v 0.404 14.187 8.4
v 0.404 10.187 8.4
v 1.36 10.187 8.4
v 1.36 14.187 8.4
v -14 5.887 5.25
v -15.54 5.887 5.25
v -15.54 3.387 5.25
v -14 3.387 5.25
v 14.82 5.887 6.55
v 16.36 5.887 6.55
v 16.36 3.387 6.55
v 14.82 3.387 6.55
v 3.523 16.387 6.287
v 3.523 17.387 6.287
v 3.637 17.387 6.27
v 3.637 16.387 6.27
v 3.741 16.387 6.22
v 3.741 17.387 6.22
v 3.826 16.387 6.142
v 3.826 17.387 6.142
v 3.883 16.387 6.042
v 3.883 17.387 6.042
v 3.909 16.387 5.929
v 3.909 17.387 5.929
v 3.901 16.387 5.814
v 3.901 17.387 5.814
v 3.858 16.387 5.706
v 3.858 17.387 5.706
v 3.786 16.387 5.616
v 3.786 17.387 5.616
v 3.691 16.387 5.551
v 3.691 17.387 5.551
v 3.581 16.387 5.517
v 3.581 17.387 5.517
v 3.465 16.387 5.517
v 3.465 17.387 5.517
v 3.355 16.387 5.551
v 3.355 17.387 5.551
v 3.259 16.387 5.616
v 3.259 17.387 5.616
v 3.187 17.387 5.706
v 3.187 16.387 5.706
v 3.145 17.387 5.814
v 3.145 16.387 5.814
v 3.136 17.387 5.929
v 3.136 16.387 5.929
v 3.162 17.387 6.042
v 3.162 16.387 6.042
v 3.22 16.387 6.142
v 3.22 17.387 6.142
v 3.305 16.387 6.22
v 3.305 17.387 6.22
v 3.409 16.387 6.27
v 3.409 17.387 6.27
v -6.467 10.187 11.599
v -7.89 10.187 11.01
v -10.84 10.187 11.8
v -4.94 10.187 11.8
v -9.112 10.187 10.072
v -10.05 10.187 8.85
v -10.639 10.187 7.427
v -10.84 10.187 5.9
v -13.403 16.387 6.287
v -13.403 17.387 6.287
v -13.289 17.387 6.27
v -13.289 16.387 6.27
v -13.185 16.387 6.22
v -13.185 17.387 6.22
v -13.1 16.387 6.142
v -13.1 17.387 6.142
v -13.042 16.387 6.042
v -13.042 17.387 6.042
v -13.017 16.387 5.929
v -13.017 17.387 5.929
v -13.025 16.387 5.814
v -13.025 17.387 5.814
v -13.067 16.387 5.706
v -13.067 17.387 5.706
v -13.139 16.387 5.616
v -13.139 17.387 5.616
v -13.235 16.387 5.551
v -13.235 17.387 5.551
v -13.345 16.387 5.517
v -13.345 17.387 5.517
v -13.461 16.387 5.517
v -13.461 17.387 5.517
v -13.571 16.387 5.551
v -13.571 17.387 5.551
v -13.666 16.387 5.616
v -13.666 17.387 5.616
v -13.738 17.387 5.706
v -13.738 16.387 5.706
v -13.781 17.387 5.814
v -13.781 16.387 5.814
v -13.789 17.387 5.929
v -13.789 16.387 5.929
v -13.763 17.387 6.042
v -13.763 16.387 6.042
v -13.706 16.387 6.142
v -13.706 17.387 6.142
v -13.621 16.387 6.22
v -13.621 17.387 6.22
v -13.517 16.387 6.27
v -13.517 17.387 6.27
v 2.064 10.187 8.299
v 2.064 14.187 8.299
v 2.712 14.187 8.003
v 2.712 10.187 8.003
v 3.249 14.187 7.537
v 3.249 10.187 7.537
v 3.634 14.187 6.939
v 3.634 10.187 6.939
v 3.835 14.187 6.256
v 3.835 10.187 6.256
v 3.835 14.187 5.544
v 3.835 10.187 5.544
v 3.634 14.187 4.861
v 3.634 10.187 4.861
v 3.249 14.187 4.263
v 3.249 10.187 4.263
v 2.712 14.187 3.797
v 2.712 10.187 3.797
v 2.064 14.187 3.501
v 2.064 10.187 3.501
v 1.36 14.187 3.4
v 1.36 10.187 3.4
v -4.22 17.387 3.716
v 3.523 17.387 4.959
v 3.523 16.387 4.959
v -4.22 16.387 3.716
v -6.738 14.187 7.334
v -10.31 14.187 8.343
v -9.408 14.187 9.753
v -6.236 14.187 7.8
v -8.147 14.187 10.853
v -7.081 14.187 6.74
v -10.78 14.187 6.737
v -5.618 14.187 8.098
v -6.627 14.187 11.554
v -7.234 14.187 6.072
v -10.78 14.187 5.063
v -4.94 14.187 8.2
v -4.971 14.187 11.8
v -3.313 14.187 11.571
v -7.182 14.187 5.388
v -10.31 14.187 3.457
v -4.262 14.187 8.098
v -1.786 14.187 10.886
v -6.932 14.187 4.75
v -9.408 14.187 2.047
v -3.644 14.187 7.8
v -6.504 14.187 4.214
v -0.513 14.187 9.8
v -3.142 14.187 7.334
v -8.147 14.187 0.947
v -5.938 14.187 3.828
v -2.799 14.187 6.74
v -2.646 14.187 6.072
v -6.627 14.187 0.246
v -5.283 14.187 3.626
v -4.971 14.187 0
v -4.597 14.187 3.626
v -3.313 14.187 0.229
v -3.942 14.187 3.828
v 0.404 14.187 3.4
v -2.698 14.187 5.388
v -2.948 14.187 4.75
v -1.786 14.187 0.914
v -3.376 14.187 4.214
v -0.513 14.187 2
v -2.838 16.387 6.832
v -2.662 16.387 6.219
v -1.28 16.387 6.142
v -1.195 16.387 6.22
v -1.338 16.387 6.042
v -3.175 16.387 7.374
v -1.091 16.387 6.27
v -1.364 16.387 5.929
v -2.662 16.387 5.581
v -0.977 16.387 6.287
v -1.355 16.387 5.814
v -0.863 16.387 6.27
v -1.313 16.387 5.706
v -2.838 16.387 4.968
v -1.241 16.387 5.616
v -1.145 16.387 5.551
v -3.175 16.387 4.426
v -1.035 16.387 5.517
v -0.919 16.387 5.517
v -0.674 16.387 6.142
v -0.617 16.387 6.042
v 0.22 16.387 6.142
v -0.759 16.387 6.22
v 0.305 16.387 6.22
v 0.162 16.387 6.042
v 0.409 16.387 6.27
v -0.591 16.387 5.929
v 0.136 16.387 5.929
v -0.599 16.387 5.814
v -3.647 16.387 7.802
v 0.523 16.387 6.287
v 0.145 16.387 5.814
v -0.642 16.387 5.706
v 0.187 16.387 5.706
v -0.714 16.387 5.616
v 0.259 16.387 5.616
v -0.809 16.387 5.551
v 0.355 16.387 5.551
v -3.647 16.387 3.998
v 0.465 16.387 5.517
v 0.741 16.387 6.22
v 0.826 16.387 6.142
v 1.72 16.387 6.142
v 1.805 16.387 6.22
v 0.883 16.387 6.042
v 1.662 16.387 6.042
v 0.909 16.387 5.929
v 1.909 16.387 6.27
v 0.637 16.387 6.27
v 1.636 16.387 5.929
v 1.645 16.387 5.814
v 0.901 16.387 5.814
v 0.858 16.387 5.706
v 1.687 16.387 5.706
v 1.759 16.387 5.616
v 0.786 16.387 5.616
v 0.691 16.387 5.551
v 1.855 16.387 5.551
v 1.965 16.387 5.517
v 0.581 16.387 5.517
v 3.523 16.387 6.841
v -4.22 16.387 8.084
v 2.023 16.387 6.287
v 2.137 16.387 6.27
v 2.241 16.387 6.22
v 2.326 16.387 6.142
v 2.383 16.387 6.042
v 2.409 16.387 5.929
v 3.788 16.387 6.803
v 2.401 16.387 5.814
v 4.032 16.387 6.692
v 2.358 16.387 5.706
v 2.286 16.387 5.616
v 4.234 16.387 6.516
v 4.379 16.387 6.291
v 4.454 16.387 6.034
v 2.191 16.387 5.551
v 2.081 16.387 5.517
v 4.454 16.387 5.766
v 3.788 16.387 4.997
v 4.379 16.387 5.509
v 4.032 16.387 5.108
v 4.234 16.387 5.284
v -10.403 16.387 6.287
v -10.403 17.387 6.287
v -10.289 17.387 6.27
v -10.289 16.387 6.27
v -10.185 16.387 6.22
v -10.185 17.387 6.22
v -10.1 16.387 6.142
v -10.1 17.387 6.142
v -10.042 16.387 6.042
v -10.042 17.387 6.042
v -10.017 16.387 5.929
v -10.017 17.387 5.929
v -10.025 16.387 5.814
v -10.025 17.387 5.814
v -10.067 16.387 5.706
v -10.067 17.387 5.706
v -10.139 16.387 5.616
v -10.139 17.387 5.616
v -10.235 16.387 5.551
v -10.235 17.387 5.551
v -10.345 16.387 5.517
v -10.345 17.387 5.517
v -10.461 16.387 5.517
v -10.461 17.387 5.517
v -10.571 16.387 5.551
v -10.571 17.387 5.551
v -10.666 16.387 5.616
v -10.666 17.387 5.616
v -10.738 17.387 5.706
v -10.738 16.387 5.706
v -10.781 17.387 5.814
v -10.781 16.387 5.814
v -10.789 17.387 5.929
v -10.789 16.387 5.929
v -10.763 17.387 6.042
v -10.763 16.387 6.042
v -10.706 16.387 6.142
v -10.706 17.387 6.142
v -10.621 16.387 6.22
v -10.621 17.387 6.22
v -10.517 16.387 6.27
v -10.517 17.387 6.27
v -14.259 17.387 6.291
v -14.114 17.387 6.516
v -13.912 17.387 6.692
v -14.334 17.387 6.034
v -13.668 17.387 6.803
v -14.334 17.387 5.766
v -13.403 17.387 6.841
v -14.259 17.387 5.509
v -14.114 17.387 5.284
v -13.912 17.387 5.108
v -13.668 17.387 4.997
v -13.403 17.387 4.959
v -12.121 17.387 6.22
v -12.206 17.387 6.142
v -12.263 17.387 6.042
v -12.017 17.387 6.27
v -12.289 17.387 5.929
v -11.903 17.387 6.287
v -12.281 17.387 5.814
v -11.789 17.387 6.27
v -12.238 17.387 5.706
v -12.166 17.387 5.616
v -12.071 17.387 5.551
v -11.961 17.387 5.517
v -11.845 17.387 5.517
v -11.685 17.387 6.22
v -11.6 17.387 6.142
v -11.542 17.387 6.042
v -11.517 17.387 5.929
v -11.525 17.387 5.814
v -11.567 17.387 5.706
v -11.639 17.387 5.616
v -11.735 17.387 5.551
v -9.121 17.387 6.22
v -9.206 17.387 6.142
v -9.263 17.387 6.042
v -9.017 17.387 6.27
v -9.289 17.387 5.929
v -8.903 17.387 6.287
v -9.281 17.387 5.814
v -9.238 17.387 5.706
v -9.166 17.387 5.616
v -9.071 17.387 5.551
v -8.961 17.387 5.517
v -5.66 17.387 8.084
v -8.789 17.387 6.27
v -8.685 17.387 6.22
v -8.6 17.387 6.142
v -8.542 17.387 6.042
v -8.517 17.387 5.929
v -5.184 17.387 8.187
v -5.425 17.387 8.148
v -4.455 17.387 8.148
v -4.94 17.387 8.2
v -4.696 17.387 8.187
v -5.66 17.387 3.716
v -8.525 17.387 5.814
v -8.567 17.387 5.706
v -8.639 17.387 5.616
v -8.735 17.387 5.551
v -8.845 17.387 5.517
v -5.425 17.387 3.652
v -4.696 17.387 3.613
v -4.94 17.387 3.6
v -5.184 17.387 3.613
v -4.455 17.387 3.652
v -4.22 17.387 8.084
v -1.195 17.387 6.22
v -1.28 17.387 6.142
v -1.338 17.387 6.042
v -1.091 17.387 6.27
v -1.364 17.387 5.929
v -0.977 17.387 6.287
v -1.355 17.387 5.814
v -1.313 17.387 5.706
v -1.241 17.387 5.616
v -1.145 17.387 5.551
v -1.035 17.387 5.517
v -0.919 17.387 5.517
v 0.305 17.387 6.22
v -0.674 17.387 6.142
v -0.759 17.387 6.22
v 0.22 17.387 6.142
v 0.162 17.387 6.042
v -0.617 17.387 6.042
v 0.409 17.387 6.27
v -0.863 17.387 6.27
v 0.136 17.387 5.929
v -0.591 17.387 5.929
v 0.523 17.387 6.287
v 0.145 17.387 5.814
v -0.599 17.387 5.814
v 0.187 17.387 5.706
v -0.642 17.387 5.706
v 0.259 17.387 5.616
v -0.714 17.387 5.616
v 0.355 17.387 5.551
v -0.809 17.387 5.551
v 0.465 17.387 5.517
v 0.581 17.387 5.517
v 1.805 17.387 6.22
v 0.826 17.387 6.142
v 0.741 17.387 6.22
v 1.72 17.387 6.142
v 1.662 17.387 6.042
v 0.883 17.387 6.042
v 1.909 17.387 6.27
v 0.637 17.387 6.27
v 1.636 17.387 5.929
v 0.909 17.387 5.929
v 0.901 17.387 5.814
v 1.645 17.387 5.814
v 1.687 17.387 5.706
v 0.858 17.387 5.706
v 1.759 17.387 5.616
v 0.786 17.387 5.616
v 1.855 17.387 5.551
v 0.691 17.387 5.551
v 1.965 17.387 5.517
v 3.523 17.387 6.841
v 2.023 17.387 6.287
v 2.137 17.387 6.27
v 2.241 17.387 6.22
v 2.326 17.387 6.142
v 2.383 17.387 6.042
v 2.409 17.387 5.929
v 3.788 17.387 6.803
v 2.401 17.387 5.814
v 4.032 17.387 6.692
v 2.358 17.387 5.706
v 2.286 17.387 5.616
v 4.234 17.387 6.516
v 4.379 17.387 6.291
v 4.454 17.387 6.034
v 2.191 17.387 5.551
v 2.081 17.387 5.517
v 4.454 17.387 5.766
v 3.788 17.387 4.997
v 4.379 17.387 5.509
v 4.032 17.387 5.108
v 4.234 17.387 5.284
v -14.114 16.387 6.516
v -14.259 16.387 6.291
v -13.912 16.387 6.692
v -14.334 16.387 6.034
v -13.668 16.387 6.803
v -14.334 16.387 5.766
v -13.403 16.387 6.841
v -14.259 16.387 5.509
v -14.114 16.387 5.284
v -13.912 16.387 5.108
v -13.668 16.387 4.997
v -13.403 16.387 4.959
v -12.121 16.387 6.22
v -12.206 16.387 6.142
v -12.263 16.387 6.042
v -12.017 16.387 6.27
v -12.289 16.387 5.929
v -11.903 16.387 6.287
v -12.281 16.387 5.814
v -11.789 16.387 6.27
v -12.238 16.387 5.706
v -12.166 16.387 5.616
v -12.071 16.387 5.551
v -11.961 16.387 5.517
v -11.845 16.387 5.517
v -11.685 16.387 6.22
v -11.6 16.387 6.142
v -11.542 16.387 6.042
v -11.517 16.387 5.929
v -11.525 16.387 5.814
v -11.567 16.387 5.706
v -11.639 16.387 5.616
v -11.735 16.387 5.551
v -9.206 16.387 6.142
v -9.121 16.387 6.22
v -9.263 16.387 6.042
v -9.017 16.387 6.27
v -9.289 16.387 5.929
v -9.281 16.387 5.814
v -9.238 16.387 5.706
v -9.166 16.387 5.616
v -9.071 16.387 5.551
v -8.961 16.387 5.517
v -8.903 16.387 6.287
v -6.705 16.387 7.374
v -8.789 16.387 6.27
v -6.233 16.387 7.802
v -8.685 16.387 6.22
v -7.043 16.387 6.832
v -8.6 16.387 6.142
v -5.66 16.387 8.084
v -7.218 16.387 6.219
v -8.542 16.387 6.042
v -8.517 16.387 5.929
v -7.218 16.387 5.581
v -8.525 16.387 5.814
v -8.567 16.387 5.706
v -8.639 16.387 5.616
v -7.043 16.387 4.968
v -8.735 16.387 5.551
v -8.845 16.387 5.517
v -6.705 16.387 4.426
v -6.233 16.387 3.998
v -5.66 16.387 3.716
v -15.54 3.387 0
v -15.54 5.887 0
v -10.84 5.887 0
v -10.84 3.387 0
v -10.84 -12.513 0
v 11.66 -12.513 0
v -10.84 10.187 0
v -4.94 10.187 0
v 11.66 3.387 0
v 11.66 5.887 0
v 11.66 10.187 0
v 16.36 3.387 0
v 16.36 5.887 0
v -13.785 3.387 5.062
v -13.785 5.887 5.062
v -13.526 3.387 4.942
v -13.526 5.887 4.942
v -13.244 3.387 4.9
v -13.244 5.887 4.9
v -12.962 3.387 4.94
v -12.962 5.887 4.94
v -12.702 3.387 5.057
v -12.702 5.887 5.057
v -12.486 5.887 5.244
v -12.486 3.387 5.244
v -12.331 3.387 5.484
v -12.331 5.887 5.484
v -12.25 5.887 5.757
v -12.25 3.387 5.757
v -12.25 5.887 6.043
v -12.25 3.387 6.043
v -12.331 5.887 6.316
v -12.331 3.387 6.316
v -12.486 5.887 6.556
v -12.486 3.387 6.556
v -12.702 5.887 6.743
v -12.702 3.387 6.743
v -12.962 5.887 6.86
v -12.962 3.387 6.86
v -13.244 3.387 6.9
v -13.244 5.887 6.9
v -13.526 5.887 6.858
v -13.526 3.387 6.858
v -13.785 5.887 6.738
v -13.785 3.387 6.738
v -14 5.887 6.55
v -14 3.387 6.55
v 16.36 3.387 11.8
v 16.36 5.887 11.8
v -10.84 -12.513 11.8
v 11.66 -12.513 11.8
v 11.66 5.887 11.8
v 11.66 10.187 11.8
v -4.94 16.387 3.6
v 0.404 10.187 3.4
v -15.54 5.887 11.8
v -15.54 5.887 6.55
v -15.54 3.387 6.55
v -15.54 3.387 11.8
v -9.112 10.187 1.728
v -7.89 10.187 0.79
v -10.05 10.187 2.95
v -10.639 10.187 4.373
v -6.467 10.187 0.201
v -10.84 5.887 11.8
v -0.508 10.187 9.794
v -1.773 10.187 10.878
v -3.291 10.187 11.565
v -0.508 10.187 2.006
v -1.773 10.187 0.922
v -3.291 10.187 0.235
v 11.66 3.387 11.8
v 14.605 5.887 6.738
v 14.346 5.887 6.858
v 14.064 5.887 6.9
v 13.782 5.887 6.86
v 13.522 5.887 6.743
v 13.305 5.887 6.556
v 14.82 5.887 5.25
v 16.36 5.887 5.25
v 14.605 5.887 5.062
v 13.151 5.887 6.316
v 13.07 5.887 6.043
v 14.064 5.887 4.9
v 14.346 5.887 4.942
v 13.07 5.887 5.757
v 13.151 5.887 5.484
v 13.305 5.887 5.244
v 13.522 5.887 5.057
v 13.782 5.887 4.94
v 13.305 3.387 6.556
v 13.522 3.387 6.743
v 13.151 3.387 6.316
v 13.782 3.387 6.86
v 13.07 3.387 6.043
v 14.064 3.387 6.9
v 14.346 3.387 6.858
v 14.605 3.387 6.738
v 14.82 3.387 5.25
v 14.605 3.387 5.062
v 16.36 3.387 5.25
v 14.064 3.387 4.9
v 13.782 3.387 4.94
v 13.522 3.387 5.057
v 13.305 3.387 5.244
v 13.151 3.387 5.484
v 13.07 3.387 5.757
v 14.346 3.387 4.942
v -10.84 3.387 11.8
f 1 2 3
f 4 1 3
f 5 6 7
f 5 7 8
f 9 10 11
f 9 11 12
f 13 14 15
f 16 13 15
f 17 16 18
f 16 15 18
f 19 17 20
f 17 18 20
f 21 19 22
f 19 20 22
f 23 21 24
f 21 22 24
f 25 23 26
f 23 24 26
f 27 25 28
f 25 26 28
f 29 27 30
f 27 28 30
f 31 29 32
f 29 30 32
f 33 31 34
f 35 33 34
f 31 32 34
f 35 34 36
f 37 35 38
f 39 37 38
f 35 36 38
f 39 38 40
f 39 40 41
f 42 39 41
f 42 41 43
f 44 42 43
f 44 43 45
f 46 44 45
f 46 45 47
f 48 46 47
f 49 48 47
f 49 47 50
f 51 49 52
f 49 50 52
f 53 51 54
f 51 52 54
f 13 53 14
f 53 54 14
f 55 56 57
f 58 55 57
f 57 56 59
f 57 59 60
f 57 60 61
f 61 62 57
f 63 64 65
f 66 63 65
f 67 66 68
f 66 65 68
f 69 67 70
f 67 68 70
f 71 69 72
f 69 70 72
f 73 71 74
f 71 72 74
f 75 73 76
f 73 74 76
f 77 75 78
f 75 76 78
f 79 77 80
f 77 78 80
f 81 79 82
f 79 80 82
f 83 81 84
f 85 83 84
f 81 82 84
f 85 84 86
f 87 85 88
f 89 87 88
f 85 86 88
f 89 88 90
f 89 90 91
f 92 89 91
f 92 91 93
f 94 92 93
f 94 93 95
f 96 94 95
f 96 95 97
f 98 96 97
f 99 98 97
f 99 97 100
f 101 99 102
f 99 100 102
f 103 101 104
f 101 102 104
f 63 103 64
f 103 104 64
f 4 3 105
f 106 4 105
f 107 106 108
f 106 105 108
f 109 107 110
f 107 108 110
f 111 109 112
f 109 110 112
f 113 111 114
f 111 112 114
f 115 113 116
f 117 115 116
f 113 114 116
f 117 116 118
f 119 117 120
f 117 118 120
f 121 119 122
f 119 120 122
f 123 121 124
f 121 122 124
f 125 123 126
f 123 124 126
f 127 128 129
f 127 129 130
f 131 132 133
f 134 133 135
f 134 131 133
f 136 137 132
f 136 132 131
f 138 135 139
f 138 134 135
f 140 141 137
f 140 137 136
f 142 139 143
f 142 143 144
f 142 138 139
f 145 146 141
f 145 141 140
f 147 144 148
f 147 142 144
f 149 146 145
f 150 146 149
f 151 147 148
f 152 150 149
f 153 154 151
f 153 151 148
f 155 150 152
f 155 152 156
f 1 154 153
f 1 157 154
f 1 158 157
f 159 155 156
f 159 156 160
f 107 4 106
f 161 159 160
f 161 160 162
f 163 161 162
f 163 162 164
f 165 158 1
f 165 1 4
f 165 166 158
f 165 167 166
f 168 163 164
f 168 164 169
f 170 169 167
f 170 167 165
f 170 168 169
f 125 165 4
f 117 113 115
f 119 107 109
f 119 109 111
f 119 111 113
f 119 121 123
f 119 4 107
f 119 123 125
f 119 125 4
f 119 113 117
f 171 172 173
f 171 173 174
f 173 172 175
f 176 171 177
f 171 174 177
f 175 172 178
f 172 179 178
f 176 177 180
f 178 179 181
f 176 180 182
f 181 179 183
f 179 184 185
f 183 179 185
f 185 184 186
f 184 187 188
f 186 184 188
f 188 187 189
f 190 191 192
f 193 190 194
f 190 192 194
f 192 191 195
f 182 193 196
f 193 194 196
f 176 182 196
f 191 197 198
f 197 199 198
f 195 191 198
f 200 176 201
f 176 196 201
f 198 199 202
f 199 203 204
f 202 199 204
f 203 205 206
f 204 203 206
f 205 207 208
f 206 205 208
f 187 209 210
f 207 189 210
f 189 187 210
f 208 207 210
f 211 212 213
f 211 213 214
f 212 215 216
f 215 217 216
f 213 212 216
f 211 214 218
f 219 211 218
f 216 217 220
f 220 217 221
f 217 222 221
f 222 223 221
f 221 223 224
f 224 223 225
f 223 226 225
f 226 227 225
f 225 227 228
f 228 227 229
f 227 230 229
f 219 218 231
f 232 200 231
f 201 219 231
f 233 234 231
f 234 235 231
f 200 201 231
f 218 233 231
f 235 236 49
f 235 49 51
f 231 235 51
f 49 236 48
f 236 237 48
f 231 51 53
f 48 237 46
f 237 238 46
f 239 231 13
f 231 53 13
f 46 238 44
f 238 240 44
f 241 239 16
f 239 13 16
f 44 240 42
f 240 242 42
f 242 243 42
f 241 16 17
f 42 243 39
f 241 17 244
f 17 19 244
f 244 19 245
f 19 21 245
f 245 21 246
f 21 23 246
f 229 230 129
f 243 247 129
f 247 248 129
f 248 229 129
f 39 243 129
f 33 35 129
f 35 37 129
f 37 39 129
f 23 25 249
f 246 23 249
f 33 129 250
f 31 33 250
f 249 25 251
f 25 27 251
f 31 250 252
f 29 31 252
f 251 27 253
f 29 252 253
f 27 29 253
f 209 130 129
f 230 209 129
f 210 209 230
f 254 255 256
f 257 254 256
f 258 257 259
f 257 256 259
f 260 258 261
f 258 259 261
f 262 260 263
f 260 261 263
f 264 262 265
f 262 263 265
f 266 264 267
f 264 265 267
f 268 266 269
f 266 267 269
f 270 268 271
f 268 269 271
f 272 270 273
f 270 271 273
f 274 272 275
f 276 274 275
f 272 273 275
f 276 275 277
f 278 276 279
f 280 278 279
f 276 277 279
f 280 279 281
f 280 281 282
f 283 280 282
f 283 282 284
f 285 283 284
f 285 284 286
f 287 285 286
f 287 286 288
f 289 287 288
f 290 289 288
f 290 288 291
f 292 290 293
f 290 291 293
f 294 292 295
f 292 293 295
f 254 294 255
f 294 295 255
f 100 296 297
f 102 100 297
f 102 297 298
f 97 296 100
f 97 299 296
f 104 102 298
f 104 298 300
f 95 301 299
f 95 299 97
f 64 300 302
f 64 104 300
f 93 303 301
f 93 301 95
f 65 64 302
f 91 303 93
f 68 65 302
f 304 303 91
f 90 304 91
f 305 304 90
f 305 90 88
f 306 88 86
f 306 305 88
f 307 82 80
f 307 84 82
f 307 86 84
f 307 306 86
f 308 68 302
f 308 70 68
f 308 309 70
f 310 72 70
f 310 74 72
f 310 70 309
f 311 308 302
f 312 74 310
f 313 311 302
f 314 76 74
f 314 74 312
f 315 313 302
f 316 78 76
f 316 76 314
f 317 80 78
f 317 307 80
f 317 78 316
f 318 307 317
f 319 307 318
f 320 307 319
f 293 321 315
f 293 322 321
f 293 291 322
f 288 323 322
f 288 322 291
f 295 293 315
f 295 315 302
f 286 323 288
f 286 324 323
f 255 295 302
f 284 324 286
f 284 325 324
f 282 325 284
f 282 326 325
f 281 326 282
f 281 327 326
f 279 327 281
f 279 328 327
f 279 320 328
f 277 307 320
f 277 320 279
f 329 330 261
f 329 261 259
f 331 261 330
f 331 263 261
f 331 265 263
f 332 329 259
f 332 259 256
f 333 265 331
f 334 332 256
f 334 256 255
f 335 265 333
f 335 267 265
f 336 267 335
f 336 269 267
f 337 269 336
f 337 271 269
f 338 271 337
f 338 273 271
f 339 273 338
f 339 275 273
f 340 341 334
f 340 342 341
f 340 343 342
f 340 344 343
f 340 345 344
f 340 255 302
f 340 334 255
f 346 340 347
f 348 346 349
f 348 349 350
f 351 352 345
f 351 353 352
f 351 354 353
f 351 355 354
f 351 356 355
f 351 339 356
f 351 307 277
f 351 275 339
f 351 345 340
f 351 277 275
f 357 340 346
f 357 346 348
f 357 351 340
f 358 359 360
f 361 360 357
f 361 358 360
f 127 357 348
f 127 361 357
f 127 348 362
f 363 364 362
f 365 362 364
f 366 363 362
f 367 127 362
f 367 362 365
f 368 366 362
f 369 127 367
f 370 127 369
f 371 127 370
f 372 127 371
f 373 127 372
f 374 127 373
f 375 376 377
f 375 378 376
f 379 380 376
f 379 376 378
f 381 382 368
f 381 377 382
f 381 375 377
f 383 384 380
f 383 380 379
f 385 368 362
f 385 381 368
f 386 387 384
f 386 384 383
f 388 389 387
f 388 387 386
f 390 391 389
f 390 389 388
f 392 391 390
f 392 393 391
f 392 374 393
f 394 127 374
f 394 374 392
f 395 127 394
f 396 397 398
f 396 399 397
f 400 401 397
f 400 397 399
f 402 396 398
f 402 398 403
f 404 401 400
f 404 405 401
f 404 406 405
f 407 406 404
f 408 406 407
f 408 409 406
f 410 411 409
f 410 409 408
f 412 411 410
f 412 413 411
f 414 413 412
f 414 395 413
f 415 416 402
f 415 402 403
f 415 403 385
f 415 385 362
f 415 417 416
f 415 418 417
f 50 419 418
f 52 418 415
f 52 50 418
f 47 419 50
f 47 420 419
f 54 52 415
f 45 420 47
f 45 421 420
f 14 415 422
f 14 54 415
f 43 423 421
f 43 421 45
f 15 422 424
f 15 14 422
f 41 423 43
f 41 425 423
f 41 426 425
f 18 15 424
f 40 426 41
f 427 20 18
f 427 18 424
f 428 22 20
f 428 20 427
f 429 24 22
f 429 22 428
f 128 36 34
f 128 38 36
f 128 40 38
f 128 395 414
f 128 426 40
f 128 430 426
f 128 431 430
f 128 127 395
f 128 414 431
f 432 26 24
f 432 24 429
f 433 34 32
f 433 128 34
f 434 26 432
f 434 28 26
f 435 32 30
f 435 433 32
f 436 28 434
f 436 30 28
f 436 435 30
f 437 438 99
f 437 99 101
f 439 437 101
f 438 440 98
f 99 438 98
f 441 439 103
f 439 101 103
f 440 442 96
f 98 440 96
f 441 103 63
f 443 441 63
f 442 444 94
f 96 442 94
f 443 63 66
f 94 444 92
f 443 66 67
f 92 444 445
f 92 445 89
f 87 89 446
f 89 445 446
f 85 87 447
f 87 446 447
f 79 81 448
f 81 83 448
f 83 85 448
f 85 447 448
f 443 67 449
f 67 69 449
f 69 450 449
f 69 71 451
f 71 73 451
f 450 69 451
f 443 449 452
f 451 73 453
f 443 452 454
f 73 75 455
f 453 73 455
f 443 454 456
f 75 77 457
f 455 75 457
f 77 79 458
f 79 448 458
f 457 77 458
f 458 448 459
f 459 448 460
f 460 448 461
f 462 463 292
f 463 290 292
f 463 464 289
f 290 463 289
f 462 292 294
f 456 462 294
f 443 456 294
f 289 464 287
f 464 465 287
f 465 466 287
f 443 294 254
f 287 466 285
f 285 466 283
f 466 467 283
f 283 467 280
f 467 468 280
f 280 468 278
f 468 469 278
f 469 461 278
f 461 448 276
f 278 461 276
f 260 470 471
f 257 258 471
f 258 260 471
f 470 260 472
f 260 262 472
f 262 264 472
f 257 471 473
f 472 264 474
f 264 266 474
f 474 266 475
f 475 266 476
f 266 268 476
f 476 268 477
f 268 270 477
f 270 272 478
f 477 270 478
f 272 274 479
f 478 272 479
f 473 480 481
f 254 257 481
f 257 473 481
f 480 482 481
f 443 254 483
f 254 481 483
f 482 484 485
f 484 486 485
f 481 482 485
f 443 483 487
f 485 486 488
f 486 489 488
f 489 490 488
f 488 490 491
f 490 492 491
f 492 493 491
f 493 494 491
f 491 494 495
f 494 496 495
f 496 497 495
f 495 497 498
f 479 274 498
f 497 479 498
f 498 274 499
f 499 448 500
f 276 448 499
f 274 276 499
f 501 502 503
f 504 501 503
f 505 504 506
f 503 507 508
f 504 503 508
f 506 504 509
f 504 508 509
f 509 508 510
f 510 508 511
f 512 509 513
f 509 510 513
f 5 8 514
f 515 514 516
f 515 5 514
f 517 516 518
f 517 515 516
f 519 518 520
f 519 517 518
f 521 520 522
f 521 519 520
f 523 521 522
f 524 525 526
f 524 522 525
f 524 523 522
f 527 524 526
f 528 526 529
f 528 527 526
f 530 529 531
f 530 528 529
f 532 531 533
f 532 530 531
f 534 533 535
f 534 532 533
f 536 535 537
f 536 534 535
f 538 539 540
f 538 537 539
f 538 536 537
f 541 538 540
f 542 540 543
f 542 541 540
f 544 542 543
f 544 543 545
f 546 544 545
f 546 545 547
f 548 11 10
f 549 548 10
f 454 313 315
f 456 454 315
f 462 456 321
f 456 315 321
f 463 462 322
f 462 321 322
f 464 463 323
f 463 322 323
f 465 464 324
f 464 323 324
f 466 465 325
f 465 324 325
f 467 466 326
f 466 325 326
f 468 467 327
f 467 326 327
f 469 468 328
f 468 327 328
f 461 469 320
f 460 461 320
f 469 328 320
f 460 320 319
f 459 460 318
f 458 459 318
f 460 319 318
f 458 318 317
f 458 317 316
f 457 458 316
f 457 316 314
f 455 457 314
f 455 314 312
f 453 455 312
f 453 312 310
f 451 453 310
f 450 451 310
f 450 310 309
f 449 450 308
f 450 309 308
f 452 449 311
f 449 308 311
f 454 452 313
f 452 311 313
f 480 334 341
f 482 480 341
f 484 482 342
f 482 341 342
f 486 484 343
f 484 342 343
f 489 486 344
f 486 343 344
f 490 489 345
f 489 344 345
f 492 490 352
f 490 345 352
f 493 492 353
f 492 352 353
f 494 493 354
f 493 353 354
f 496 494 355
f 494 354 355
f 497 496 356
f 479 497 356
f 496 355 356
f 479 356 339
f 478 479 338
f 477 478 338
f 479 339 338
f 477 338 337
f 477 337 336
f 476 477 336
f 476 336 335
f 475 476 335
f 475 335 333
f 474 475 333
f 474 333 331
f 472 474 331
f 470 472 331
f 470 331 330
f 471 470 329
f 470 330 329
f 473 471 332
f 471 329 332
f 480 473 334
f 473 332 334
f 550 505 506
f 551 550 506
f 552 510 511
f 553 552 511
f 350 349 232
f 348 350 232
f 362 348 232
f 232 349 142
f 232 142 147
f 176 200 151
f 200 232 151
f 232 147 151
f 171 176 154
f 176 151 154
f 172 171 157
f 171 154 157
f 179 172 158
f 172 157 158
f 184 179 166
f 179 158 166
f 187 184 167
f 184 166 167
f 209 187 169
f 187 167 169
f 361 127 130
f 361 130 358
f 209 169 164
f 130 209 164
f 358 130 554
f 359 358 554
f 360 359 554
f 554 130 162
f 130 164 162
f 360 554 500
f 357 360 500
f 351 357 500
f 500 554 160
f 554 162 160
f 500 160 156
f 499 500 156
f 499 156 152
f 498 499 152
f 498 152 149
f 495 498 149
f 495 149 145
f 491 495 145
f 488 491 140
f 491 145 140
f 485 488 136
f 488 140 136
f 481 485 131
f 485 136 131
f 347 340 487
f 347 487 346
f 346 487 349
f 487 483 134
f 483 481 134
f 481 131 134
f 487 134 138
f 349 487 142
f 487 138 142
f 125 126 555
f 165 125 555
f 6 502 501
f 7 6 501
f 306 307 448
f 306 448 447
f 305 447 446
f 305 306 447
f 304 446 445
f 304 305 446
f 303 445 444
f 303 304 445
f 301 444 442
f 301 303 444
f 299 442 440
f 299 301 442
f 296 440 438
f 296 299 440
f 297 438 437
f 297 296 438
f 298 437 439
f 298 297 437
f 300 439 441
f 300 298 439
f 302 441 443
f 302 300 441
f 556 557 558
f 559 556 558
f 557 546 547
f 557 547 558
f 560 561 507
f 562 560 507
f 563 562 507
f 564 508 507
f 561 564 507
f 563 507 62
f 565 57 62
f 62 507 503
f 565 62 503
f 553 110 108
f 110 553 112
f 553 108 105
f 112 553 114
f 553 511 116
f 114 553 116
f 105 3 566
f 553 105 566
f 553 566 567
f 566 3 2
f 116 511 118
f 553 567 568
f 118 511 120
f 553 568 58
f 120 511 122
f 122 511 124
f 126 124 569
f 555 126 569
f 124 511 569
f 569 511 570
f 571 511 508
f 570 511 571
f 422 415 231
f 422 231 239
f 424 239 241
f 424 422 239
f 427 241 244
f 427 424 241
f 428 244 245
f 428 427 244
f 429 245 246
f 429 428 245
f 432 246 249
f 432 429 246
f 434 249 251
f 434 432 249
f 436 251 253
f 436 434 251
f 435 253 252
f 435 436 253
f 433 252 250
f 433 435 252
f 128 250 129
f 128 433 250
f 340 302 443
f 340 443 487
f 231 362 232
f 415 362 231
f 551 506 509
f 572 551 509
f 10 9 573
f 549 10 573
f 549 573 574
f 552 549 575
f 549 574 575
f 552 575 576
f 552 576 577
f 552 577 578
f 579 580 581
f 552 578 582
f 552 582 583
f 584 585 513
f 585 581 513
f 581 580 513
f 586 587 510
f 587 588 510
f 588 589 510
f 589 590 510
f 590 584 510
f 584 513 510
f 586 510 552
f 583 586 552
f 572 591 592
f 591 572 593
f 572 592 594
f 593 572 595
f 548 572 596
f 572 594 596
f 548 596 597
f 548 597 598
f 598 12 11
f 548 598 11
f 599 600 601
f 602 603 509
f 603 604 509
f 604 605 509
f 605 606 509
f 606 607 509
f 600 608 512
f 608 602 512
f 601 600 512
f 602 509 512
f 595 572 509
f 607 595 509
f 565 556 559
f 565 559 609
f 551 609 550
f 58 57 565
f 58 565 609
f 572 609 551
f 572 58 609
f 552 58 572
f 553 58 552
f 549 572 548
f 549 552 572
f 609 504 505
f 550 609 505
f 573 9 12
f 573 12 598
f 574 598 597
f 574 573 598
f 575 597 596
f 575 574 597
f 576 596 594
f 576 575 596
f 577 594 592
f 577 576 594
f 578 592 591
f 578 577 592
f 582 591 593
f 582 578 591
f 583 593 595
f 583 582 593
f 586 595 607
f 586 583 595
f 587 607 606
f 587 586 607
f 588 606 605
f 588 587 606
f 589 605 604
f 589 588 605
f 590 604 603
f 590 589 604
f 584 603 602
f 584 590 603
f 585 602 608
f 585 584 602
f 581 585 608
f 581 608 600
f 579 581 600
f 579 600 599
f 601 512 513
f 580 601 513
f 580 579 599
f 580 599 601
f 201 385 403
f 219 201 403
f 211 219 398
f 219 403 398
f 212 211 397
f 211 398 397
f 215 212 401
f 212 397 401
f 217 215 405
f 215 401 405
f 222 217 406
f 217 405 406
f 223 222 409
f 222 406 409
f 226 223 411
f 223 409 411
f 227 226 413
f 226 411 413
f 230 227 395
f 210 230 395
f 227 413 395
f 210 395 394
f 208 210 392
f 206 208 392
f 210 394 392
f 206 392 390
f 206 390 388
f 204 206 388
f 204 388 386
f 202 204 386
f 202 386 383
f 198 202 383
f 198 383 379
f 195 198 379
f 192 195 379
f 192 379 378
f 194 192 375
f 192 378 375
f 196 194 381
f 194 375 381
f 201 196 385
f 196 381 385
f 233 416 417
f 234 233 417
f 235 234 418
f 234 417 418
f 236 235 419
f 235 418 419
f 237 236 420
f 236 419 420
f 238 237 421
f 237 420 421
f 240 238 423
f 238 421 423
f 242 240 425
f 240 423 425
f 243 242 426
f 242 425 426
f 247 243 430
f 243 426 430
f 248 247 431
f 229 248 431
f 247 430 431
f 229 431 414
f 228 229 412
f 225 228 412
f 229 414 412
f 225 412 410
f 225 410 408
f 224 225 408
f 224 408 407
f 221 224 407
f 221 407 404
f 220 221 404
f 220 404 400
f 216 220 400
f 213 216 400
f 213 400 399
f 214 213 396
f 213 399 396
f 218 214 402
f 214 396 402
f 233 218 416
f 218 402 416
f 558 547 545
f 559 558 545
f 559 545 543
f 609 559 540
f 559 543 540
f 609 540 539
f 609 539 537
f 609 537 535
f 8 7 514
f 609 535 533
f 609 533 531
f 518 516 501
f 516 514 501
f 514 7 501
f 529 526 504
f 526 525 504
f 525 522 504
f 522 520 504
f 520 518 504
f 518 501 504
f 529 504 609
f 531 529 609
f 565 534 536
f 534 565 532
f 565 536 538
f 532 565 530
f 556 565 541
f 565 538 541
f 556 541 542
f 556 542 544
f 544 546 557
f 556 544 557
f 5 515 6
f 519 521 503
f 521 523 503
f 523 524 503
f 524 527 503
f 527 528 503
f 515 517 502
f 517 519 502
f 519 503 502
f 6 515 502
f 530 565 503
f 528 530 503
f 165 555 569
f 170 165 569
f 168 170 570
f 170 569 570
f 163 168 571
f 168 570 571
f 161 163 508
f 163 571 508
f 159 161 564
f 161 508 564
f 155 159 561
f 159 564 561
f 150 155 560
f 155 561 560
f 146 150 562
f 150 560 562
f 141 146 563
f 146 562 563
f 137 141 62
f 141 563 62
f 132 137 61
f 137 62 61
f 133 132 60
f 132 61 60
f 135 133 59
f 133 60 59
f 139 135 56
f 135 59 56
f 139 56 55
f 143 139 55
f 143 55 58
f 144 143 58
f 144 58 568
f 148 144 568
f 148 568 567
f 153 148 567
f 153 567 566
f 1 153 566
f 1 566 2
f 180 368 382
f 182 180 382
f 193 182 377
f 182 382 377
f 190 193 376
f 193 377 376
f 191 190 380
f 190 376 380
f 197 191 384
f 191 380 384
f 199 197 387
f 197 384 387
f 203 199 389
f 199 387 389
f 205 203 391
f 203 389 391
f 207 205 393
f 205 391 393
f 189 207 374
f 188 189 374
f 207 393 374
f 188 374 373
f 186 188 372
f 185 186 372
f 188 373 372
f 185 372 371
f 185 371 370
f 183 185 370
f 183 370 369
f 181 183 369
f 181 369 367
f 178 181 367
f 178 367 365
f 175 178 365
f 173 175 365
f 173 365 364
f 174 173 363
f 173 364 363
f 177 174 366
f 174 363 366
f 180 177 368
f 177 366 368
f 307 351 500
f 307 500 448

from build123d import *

# Parameters (mm, degrees)
SALIENTE_EXTRUIR1_DEPTH = 11.8
CROQUIS2_R              = 2.3
SALIENTE_EXTRUIR2_DEPTH = 4
CROQUIS3_R              = 2.3
SALIENTE_EXTRUIR3_DEPTH = 7.2
CORTAR_EXTRUIR1_DEPTH   = 7.2
CROQUIS5_R              = 0.38741291
SALIENTE_EXTRUIR4_DEPTH = 1


with BuildPart() as part:
    # Croquis1 → Saliente-Extruir1 (new body)
    with BuildSketch(Plane.XY):
        Polygon((-10.840013315, -12.513302196), (11.659986685, -12.513302196), (11.659986685, 3.386697804), (16.359986685, 3.386697804), (16.359986685, 5.886697804), (11.659986685, 5.886697804), (11.659986685, 10.186697804), (-10.840013315, 10.186697804), (-10.840013315, 5.886697804), (-15.540013315, 5.886697804), (-15.540013315, 3.386697804), (-10.840013315, 3.386697804), align=None)
    extrude(amount=SALIENTE_EXTRUIR1_DEPTH)

    # Croquis2 → Saliente-Extruir2 (add)
    with BuildSketch(Plane(origin=(0, 10.186697804, 0), x_dir=(1, 0, 0), z_dir=(0, 1, 0))):
        with BuildLine():
            Line((1.359986685, -3.4), (0.404142371, -3.4))
            ThreePointArc((0.404142371, -3.4), (-10.840013315, -5.9), (0.404142371, -8.4))
            Line((0.404142371, -8.4), (1.359986685, -8.4))
            ThreePointArc((1.359986685, -8.4), (3.859986685, -5.9), (1.359986685, -3.4))
        make_face()
        with Locations(Location((-4.940013315, -5.9, 0), (0, 0, 270))):
            Circle(CROQUIS2_R, mode=Mode.SUBTRACT)
    extrude(amount=SALIENTE_EXTRUIR2_DEPTH)

    # Croquis3 → Saliente-Extruir3 (add)
    with BuildSketch(Plane(origin=(0, 10.186697804, 0), x_dir=(1, 0, 0), z_dir=(0, 1, 0))):
        with Locations(Location((-4.940013315, -5.9, 0), (0, 0, 270))):
            Circle(CROQUIS3_R)
    extrude(amount=SALIENTE_EXTRUIR3_DEPTH)

    # Croquis4 → Cortar-Extruir1 (cut)
    with BuildSketch(Plane(origin=(0, 5.886697804, 0), x_dir=(1, 0, 0), z_dir=(0, 1, 0))):
        with BuildLine():
            Line((16.359986685, -5.25), (16.359986685, -6.55))
            Line((16.359986685, -6.55), (14.819920893, -6.55))
            ThreePointArc((14.819920893, -6.55), (13.059986685, -5.9), (14.819920893, -5.25))
            Line((14.819920893, -5.25), (16.359986685, -5.25))
        make_face()
        with BuildLine():
            Line((-15.540013315, -6.55), (-15.540013315, -5.25))
            Line((-15.540013315, -5.25), (-13.999947523, -5.25))
            ThreePointArc((-13.999947523, -5.25), (-12.240013315, -5.9), (-13.999947523, -6.55))
            Line((-13.999947523, -6.55), (-15.540013315, -6.55))
        make_face()
    extrude(amount=-CORTAR_EXTRUIR1_DEPTH, mode=Mode.SUBTRACT)

    # Croquis5 → Saliente-Extruir4 (add)
    with BuildSketch(Plane(origin=(0, 17.386697804, 0), x_dir=(1, 0, 0), z_dir=(0, 1, 0))):
        with BuildLine():
            Line((3.522810247, -4.959091344), (-4.940013315, -3.6))
            Line((-4.940013315, -3.6), (-13.402836876, -4.959091344))
            ThreePointArc((-13.402836876, -4.959091344), (-14.343745532, -5.9), (-13.402836876, -6.840908656))
            Line((-13.402836876, -6.840908656), (-4.940013315, -8.2))
            Line((-4.940013315, -8.2), (3.522810247, -6.840908656))
            ThreePointArc((3.522810247, -6.840908656), (4.463718903, -5.9), (3.522810247, -4.959091344))
        make_face()
        with Locations(Location((3.522810247, -5.9, 0), (0, 0, 270))):
            Circle(CROQUIS5_R, mode=Mode.SUBTRACT)
        with Locations(Location((2.022810247, -5.9, 0), (0, 0, 270))):
            Circle(CROQUIS5_R, mode=Mode.SUBTRACT)
        with Locations(Location((0.522810247, -5.9, 0), (0, 0, 270))):
            Circle(CROQUIS5_R, mode=Mode.SUBTRACT)
        with Locations(Location((-0.977189753, -5.9, 0), (0, 0, 270))):
            Circle(CROQUIS5_R, mode=Mode.SUBTRACT)
        with Locations(Location((-13.402836876, -5.9, 0), (0, 0, 270))):
            Circle(CROQUIS5_R, mode=Mode.SUBTRACT)
        with Locations(Location((-11.902836876, -5.9, 0), (0, 0, 270))):
            Circle(CROQUIS5_R, mode=Mode.SUBTRACT)
        with Locations(Location((-10.402836876, -5.9, 0), (0, 0, 270))):
            Circle(CROQUIS5_R, mode=Mode.SUBTRACT)
        with Locations(Location((-8.902836876, -5.9, 0), (0, 0, 270))):
            Circle(CROQUIS5_R, mode=Mode.SUBTRACT)
    extrude(amount=-SALIENTE_EXTRUIR4_DEPTH)


solid = part.part
